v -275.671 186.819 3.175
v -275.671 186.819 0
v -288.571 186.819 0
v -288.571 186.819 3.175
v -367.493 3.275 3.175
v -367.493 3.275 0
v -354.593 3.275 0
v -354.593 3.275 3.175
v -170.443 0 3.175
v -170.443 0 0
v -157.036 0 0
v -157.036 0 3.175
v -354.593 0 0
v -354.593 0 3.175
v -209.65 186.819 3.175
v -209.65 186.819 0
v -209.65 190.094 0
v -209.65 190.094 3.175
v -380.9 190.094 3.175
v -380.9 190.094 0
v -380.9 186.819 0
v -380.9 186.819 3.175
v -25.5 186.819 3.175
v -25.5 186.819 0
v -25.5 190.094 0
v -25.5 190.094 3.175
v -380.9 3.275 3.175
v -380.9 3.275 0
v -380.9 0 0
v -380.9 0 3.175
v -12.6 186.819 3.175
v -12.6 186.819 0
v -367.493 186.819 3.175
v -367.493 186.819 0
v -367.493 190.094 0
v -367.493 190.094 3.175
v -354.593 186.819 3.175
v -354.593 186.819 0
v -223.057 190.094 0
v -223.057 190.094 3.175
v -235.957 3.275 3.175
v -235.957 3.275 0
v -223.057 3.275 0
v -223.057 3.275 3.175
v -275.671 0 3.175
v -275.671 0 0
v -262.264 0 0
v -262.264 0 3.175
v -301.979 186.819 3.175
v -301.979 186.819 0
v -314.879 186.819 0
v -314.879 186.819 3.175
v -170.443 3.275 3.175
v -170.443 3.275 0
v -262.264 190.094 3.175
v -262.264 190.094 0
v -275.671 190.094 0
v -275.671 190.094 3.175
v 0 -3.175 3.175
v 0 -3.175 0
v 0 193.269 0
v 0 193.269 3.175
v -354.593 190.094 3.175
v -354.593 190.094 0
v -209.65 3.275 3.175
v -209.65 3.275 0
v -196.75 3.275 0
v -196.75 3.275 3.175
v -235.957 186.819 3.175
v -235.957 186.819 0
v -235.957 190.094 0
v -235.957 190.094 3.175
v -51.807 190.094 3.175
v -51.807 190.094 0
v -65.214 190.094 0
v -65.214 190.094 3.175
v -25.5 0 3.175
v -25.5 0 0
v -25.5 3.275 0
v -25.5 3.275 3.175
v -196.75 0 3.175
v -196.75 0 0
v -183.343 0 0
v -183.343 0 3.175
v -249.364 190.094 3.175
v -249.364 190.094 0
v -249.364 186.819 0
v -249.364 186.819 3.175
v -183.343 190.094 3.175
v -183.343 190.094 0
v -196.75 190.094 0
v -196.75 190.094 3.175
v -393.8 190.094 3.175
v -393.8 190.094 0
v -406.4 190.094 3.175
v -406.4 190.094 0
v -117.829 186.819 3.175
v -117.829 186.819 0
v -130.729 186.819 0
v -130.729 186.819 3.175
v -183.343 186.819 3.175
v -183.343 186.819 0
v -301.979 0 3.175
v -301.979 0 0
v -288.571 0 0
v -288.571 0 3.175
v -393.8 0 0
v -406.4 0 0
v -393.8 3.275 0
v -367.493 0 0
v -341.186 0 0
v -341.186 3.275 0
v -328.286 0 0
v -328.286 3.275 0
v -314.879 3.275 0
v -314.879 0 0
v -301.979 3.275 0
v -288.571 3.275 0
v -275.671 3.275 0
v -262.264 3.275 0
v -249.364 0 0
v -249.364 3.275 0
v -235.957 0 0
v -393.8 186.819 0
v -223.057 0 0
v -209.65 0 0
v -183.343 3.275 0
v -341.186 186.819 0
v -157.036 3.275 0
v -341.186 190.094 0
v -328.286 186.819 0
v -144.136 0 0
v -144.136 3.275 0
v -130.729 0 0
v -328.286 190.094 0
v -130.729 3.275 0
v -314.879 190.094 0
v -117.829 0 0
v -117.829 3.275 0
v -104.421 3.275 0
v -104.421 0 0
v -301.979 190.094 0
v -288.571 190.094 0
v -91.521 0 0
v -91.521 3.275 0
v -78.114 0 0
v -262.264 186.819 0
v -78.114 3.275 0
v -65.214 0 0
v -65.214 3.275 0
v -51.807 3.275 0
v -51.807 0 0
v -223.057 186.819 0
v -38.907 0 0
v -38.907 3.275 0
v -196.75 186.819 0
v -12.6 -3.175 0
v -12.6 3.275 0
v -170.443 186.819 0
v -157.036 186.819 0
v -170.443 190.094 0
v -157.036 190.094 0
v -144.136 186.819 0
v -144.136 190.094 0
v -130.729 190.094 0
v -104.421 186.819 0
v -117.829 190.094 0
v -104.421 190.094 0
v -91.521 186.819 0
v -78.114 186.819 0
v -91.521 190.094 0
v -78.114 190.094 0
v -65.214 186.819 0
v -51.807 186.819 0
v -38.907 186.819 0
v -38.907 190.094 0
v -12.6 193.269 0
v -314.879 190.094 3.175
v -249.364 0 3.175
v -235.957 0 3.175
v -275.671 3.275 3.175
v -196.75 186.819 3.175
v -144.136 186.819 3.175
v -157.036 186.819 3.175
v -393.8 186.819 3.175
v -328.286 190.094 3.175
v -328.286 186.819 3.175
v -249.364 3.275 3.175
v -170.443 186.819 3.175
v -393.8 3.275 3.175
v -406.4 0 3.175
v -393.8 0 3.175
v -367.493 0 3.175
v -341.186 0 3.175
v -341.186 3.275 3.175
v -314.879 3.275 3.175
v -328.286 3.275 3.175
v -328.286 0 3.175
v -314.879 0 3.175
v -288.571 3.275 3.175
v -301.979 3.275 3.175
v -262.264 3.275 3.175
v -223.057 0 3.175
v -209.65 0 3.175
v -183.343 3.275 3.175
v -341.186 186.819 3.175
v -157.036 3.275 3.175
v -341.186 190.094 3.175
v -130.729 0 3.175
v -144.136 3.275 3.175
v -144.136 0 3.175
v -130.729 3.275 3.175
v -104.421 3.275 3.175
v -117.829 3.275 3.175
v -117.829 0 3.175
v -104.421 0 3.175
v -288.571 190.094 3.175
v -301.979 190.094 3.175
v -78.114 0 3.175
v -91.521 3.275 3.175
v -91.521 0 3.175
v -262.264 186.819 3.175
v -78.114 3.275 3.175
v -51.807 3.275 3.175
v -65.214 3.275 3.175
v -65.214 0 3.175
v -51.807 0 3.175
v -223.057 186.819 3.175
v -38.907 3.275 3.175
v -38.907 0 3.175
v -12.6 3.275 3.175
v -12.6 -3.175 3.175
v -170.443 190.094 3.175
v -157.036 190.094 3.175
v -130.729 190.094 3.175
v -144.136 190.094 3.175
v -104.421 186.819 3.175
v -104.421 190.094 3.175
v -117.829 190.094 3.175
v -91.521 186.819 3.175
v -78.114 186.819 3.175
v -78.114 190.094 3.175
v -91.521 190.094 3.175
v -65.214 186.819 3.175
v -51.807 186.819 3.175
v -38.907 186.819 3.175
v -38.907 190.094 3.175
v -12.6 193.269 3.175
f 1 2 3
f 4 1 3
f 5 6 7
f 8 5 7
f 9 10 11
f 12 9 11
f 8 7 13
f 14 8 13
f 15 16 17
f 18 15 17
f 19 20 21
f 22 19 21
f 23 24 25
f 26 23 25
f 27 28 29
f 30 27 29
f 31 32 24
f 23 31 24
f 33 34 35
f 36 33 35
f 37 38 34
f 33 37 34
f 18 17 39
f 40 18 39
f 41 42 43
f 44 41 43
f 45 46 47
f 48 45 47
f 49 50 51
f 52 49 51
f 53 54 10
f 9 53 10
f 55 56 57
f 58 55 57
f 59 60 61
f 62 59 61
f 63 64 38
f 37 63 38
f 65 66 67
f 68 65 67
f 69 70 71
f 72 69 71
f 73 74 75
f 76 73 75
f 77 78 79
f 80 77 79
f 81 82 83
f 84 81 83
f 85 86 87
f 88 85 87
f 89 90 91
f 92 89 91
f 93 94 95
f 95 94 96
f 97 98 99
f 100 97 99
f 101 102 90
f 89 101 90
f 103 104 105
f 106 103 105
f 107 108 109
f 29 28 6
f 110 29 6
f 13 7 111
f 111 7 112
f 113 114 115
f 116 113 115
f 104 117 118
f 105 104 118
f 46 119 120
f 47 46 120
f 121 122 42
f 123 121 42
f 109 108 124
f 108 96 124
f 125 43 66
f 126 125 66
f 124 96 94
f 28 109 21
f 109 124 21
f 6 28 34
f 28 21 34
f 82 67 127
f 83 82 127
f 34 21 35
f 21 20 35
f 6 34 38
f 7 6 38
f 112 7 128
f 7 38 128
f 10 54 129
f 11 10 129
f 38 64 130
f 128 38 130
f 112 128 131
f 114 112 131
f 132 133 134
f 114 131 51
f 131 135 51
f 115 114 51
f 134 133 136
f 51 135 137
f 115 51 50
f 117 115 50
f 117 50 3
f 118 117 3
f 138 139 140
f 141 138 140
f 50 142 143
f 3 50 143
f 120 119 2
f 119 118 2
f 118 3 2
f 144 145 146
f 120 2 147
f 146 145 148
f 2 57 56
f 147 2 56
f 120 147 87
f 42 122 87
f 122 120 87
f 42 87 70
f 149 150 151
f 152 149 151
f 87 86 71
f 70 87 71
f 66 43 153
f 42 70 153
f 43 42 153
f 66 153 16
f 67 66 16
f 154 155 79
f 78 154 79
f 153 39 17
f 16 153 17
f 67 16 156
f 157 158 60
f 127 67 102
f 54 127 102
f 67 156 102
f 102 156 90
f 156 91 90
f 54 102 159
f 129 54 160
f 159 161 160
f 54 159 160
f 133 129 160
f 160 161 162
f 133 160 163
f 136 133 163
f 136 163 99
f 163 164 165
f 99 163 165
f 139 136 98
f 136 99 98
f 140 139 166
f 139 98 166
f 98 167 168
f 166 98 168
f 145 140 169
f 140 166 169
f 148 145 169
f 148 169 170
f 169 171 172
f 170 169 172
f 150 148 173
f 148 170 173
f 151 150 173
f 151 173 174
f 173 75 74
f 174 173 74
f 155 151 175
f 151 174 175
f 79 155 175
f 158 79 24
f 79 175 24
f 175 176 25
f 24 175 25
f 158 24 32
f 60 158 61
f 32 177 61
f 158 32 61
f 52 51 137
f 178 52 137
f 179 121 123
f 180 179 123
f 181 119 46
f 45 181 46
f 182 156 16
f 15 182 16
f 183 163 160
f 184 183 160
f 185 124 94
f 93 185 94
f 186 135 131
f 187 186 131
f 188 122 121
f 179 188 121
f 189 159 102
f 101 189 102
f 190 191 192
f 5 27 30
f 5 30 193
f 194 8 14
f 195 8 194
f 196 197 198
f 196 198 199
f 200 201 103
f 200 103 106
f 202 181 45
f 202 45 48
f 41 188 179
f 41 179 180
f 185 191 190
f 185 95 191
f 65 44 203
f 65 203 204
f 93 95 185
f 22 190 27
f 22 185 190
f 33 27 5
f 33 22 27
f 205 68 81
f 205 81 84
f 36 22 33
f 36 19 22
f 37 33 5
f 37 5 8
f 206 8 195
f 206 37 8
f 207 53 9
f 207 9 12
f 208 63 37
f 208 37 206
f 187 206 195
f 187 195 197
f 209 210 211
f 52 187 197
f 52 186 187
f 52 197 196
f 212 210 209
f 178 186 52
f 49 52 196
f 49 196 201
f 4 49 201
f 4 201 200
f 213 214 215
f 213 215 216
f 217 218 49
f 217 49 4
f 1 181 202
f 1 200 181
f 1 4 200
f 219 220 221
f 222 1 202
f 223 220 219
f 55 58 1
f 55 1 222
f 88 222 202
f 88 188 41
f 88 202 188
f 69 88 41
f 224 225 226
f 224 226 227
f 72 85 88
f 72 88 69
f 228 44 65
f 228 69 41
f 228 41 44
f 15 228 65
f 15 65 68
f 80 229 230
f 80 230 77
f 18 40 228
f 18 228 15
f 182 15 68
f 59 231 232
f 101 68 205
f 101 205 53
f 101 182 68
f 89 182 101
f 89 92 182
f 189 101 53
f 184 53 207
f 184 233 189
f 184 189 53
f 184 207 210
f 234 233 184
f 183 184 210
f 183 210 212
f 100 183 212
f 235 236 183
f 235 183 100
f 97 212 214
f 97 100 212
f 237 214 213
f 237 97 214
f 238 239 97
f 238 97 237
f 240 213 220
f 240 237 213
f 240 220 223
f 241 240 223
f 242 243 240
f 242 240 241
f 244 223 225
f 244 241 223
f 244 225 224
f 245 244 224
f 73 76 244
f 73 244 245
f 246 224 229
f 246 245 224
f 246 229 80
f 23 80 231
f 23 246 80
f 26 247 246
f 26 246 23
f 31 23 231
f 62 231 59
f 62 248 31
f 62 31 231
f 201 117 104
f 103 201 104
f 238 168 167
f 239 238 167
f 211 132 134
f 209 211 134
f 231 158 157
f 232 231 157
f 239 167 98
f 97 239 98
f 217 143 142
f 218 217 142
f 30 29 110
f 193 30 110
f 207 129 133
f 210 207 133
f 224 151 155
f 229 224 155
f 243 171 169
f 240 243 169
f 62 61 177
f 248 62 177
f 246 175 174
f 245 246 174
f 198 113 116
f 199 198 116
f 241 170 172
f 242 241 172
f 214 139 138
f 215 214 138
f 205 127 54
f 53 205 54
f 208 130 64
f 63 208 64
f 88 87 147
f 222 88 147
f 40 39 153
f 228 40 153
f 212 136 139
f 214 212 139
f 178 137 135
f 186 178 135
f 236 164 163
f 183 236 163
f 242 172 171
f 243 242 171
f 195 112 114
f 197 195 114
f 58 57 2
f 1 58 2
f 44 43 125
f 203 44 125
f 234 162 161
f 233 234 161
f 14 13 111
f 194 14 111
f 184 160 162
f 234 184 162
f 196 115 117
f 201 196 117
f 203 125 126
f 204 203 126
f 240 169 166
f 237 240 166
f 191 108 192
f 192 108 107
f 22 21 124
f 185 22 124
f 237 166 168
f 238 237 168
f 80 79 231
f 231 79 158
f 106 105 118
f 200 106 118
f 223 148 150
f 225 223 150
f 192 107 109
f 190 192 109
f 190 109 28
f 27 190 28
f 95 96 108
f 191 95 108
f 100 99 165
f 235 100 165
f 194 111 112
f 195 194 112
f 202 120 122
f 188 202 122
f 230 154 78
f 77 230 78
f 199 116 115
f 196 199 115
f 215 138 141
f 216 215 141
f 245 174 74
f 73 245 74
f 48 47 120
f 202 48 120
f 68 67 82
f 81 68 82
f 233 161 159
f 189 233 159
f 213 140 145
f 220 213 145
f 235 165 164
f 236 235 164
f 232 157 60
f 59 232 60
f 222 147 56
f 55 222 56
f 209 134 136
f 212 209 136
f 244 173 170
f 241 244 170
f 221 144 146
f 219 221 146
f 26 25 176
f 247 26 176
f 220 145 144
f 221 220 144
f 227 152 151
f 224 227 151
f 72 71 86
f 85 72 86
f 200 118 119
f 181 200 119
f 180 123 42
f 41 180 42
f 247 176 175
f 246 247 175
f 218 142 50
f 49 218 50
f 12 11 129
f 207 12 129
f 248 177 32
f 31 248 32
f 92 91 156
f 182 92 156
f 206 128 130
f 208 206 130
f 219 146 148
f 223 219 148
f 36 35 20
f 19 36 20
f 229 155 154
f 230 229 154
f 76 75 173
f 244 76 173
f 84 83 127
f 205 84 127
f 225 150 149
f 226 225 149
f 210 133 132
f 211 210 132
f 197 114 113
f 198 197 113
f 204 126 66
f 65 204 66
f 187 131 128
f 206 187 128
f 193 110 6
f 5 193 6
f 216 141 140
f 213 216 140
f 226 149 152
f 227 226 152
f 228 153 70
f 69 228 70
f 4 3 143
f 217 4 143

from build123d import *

# Parameters (mm, degrees)
BOSS_EXTRUDE1_DEPTH = 3.175


with BuildPart() as part:
    # Sketch1 → Boss-Extrude1 (new body)
    with BuildSketch(Plane.XY):
        Polygon((-12.6, 186.8186), (-25.5, 186.8186), (-25.5, 190.0936), (-38.907142857, 190.0936), (-38.907142857, 186.8186), (-51.807142857, 186.8186), (-51.807142857, 190.0936), (-65.214285714, 190.0936), (-65.214285714, 186.8186), (-78.114285714, 186.8186), (-78.114285714, 190.0936), (-91.521428571, 190.0936), (-91.521428571, 186.8186), (-104.421428571, 186.8186), (-104.421428571, 190.0936), (-117.828571429, 190.0936), (-117.828571429, 186.8186), (-130.728571429, 186.8186), (-130.728571429, 190.0936), (-144.135714286, 190.0936), (-144.135714286, 186.8186), (-157.035714286, 186.8186), (-157.035714286, 190.0936), (-170.442857143, 190.0936), (-170.442857143, 186.8186), (-183.342857143, 186.8186), (-183.342857143, 190.0936), (-196.75, 190.0936), (-196.75, 186.8186), (-209.65, 186.8186), (-209.65, 190.0936), (-223.057142857, 190.0936), (-223.057142857, 186.8186), (-235.957142857, 186.8186), (-235.957142857, 190.0936), (-249.364285714, 190.0936), (-249.364285714, 186.8186), (-262.264285714, 186.8186), (-262.264285714, 190.0936), (-275.671428571, 190.0936), (-275.671428571, 186.8186), (-288.571428571, 186.8186), (-288.571428571, 190.0936), (-301.978571429, 190.0936), (-301.978571429, 186.8186), (-314.878571429, 186.8186), (-314.878571429, 190.0936), (-328.285714286, 190.0936), (-328.285714286, 186.8186), (-341.185714286, 186.8186), (-341.185714286, 190.0936), (-354.592857143, 190.0936), (-354.592857143, 186.8186), (-367.492857143, 186.8186), (-367.492857143, 190.0936), (-380.9, 190.0936), (-380.9, 186.8186), (-393.8, 186.8186), (-393.8, 190.0936), (-406.4, 190.0936), (-406.4, 0), (-393.8, 0), (-393.8, 3.275), (-380.9, 3.275), (-380.9, 0), (-367.492857143, 0), (-367.492857143, 3.275), (-354.592857143, 3.275), (-354.592857143, 0), (-341.185714286, 0), (-341.185714286, 3.275), (-328.285714286, 3.275), (-328.285714286, 0), (-314.878571429, 0), (-314.878571429, 3.275), (-301.978571429, 3.275), (-301.978571429, 0), (-288.571428571, 0), (-288.571428571, 3.275), (-275.671428571, 3.275), (-275.671428571, 0), (-262.264285714, 0), (-262.264285714, 3.275), (-249.364285714, 3.275), (-249.364285714, 0), (-235.957142857, 0), (-235.957142857, 3.275), (-223.057142857, 3.275), (-223.057142857, 0), (-209.65, 0), (-209.65, 3.275), (-196.75, 3.275), (-196.75, 0), (-183.342857143, 0), (-183.342857143, 3.275), (-170.442857143, 3.275), (-170.442857143, 0), (-157.035714286, 0), (-157.035714286, 3.275), (-144.135714286, 3.275), (-144.135714286, 0), (-130.728571429, 0), (-130.728571429, 3.275), (-117.828571429, 3.275), (-117.828571429, 0), (-104.421428571, 0), (-104.421428571, 3.275), (-91.521428571, 3.275), (-91.521428571, 0), (-78.114285714, 0), (-78.114285714, 3.275), (-65.214285714, 3.275), (-65.214285714, 0), (-51.807142857, 0), (-51.807142857, 3.275), (-38.907142857, 3.275), (-38.907142857, 0), (-25.5, 0), (-25.5, 3.275), (-12.6, 3.275), (-12.6000002, -3.175), (0, -3.175), (0, 193.2686), (-12.6000002, 193.2686), align=None)
    extrude(amount=BOSS_EXTRUDE1_DEPTH)


solid = part.part
